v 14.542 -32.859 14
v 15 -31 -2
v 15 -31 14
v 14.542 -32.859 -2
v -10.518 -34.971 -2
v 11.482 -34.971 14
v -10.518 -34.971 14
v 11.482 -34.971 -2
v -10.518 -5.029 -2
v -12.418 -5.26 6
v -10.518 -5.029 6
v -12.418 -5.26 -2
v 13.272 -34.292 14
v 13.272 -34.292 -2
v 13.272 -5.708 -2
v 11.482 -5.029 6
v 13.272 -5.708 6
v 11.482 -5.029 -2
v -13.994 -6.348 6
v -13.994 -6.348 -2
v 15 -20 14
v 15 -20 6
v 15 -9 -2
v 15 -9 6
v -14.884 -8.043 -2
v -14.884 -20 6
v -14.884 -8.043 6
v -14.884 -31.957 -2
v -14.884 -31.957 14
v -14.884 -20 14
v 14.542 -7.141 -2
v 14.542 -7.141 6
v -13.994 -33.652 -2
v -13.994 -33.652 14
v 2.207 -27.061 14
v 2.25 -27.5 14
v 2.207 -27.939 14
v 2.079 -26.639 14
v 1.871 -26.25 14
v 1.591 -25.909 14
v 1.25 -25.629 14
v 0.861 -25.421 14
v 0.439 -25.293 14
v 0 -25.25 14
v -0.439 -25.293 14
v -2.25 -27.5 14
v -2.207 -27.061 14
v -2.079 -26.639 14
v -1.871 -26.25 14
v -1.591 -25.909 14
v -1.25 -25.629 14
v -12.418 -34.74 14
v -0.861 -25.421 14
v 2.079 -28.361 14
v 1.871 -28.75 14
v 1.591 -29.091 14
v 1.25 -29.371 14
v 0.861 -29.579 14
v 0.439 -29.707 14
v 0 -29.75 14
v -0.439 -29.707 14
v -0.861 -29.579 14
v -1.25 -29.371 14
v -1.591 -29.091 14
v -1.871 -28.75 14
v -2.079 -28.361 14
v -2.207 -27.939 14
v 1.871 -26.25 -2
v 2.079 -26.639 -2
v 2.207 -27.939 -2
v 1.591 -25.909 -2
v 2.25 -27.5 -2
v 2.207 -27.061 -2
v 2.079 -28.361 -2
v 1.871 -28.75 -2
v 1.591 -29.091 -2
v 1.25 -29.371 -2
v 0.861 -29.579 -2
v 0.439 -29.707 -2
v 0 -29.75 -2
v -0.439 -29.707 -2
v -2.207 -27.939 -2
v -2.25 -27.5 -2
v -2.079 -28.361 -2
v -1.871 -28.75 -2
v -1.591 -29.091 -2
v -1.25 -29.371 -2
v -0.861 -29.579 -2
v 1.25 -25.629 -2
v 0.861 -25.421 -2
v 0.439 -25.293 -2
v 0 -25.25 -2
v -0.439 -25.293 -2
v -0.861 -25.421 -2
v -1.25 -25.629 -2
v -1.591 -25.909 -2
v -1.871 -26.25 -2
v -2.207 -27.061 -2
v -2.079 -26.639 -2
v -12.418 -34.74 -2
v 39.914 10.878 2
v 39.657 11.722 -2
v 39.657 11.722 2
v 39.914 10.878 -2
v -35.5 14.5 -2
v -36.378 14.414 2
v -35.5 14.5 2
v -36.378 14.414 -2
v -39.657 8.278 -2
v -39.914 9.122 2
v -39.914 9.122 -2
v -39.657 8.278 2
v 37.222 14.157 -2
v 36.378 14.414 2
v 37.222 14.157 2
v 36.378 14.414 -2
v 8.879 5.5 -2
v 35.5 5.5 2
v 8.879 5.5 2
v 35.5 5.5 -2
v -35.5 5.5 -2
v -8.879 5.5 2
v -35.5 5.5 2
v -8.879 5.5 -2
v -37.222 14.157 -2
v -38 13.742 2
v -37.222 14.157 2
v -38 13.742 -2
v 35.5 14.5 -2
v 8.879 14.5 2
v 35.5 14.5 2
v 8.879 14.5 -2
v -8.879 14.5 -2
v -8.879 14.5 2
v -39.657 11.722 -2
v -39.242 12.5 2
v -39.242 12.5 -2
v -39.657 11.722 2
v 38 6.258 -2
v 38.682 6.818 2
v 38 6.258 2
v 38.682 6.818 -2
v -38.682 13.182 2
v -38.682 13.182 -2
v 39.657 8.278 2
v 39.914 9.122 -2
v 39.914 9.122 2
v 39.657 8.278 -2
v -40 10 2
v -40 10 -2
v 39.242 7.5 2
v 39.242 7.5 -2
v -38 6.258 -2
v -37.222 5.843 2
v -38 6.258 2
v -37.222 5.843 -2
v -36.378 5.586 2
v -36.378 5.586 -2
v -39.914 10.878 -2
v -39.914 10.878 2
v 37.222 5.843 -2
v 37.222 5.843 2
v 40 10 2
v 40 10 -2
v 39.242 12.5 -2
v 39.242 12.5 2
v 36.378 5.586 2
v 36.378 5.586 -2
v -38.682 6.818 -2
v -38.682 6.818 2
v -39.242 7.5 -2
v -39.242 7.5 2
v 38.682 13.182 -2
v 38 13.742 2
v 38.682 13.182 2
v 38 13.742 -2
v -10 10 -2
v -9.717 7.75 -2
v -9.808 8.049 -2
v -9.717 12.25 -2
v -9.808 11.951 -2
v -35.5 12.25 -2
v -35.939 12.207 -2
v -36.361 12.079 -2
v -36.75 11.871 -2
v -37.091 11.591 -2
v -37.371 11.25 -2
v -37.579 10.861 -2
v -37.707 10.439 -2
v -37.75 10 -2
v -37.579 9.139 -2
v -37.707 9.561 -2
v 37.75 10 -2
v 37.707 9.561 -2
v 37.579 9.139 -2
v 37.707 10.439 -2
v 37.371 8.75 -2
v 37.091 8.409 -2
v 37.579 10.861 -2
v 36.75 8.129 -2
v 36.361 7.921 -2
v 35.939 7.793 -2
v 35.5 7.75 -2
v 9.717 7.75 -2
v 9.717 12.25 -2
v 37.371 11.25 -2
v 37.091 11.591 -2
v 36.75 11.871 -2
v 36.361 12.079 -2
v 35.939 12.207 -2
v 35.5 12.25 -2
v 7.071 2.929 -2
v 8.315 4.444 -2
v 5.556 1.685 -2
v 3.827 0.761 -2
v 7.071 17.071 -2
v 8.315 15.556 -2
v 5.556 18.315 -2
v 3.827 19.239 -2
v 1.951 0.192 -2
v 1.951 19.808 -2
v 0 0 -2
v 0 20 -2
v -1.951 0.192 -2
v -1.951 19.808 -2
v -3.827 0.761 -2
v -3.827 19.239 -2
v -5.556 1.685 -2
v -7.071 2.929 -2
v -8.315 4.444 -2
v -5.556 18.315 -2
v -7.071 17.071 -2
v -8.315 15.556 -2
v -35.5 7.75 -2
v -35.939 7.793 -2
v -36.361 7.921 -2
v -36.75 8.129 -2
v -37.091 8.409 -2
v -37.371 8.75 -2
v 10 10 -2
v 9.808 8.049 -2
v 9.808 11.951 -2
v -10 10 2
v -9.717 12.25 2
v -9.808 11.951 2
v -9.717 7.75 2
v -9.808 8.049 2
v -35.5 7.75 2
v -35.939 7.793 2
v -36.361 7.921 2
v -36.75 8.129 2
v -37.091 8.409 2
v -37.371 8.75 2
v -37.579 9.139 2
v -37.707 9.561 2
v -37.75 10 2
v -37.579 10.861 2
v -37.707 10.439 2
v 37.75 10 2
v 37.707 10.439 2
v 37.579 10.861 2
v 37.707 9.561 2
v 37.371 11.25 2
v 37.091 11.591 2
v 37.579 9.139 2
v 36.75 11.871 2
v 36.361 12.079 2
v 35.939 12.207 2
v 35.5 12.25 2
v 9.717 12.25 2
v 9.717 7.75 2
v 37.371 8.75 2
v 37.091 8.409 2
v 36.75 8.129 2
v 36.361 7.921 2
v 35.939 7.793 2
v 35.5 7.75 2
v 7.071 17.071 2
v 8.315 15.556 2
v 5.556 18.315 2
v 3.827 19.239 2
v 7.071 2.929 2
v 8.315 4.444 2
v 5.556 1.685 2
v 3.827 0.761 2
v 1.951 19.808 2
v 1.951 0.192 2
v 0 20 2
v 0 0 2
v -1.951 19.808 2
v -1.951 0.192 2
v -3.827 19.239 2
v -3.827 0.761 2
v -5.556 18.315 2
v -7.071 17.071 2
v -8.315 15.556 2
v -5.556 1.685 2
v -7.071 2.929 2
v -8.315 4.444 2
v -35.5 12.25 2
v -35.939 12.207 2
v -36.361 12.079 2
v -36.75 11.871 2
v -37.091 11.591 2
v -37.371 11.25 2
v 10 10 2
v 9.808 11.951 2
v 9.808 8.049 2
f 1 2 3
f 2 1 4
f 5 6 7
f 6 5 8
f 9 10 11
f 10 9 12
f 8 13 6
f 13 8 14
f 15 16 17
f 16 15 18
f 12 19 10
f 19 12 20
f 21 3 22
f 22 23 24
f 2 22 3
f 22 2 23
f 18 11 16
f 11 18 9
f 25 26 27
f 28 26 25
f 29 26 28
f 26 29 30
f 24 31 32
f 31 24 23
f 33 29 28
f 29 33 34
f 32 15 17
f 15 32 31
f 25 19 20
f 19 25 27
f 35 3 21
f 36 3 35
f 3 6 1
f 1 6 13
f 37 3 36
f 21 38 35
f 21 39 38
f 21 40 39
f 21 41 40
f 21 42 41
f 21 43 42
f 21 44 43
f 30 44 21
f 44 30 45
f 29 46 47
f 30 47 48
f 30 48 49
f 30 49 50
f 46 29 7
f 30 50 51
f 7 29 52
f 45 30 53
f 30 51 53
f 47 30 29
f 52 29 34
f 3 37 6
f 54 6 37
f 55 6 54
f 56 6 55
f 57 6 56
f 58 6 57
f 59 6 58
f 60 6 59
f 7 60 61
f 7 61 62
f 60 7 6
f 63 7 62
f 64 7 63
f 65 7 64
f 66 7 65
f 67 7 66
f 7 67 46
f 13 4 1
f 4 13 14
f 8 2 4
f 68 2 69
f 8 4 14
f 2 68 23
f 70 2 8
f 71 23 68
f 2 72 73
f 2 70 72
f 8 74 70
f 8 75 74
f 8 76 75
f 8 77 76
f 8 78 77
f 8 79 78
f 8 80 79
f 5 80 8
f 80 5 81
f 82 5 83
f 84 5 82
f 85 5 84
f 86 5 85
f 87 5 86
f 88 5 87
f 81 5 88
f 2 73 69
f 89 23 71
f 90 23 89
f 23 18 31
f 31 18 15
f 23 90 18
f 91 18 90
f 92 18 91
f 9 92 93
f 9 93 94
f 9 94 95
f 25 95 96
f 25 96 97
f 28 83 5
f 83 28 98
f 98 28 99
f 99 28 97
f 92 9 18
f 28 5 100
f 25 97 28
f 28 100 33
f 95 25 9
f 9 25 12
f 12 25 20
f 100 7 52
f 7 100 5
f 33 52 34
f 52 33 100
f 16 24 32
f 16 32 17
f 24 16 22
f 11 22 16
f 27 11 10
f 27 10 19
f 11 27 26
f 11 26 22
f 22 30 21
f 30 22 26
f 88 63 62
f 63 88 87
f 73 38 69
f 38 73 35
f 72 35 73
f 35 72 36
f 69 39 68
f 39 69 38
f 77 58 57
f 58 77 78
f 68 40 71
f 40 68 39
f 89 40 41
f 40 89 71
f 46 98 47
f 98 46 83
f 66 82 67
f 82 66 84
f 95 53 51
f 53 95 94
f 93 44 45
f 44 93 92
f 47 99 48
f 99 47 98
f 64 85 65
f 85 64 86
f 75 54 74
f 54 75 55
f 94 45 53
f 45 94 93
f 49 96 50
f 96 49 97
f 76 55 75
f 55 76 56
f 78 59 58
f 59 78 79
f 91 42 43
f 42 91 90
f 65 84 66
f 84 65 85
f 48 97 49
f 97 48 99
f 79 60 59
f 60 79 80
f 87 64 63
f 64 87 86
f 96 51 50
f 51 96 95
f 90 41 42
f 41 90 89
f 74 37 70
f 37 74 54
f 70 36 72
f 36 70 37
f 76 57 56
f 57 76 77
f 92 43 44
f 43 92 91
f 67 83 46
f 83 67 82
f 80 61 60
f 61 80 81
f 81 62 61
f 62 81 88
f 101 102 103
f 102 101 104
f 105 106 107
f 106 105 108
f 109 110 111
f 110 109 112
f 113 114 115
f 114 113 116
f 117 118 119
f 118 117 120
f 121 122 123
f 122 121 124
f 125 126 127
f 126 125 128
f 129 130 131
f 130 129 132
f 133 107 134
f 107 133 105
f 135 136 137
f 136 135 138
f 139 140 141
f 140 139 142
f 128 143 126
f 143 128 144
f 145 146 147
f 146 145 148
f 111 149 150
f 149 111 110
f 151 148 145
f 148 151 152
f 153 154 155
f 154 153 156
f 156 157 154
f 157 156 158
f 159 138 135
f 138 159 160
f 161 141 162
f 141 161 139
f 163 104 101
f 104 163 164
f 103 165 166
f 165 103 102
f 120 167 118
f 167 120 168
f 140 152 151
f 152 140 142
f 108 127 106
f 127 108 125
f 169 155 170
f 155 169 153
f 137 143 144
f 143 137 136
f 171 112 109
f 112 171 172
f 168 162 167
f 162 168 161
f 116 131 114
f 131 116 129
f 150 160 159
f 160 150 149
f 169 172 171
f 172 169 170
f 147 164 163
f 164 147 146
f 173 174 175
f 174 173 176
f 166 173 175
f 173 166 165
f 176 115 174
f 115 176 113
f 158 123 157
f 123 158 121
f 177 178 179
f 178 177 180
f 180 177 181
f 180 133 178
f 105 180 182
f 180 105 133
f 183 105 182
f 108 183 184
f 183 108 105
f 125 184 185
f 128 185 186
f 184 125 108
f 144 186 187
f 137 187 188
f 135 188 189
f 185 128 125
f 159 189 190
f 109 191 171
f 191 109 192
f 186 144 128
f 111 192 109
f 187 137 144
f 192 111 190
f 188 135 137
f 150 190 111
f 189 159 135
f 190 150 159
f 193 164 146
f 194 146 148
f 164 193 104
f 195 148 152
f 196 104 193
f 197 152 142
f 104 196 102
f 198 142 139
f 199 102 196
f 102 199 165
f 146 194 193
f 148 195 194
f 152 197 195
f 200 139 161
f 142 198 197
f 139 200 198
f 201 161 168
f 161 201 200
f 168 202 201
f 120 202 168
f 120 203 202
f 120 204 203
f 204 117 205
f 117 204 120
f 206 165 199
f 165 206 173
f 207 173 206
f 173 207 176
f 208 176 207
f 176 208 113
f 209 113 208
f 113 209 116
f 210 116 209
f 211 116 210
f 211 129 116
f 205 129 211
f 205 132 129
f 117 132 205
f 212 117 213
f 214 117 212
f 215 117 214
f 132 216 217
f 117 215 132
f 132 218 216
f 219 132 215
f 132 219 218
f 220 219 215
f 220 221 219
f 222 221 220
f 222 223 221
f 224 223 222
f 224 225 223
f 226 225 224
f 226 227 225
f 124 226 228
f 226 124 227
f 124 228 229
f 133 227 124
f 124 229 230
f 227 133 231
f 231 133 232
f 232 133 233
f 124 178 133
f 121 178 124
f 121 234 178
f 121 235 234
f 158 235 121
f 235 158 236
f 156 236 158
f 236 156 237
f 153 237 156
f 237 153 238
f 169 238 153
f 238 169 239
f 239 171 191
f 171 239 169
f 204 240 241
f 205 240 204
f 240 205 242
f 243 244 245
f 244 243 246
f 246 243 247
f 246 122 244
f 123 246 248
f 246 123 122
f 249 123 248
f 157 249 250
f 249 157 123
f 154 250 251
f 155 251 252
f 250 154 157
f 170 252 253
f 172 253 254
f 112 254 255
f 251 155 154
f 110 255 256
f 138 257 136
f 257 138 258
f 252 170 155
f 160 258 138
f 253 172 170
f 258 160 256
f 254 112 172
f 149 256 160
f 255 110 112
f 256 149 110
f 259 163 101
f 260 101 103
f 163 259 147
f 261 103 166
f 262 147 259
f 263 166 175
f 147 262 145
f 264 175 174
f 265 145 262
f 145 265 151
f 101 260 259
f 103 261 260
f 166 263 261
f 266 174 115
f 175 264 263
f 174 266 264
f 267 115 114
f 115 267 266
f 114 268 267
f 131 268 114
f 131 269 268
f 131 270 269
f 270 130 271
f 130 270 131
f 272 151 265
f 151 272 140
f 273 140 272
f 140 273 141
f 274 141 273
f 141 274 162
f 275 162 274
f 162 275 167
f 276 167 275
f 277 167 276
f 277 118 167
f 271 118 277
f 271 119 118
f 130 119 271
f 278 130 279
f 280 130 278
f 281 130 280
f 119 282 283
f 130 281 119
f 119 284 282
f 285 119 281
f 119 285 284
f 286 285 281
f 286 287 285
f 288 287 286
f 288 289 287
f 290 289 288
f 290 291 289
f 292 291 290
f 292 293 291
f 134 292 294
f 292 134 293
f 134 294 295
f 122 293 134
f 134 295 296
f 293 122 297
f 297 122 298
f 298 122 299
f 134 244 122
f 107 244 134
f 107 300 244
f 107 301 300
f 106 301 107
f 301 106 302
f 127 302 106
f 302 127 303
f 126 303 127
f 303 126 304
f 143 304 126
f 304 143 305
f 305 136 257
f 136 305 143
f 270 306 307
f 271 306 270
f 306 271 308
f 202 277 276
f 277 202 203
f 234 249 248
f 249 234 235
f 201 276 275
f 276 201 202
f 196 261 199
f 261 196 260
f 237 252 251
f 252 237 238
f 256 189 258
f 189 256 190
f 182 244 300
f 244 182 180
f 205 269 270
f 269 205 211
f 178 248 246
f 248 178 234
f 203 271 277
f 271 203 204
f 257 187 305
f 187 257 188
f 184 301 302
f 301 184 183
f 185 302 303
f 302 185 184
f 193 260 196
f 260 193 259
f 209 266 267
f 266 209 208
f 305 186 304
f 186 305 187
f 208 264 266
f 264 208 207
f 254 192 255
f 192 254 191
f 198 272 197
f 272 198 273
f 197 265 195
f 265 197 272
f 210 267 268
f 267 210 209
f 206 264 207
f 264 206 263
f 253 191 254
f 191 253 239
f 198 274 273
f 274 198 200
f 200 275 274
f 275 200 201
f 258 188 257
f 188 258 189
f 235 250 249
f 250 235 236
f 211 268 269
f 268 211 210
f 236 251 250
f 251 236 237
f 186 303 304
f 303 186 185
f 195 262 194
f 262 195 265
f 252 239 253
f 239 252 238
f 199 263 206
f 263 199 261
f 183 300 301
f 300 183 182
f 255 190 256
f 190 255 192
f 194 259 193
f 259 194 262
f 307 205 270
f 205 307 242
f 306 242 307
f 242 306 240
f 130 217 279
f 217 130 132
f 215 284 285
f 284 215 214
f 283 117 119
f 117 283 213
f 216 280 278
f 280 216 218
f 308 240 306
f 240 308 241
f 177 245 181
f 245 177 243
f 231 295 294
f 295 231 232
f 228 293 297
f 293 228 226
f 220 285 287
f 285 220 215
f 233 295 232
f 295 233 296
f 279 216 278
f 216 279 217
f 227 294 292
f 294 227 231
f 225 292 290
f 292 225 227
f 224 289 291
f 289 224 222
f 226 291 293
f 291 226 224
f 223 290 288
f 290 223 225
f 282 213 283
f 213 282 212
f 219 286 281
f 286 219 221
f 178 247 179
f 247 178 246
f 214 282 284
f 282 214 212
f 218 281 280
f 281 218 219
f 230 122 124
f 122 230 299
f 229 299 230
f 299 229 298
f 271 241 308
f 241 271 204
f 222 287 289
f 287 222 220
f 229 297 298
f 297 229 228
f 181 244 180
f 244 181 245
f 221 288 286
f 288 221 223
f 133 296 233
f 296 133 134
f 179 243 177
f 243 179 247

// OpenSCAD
len_phone = 145;
width_phone = 56;
thickness_phone = 8;
corner_round = 8;

d_screw_m4 = 4.5;
thickness_holder = 4;
append = 15;
w_grip = 30;

//holder_base();
//holder_set();
// horizontal_block(20);
// vertical_block(len_phone);
//grip();
test_print_holder();

module test_print_holder() {
translate([0, -20, 6])
grip();
horizontal_block(len_block=width_phone, offset_vertical=10);
}

module grip(){
        difference(){
        grip_base();

        color("red")
        translate([0, w_grip/2, thickness_phone])
        cube([w_grip+1, w_grip, 2*thickness_phone], center=true);
        
        translate ([0, -w_grip/4, 0])
        cylinder(d=d_screw_m4, 3*thickness_phone, center=true, $fn=32);
    }
}

module grip_base() {
    hull() {
        translate([w_grip/2-corner_round/2, -w_grip/2+corner_round/2, 0])
        cylinder(d=corner_round, 2*thickness_phone, center=true);
        translate([-w_grip/2+corner_round/2, -w_grip/2+corner_round/2, 0])
        cylinder(d=corner_round, 2*thickness_phone, center=true);
        translate([w_grip/2-corner_round/2, w_grip/2-corner_round/2, 0])
        cylinder(d=corner_round, 2*thickness_phone, center=true);
        translate([-w_grip/2+corner_round/2, w_grip/2-corner_round/2, 0])
        cylinder(d=corner_round, 2*thickness_phone, center=true);
    }
}

module holder_set() {
    
    holder_base();
    
    translate([0, -len_phone/2, thickness_phone+thickness_holder/2+1])
    rotate([0, 180, 0])
    grip();
    
    translate([0, len_phone/2, thickness_phone+thickness_holder/2])
    rotate([0, 180, 180])
    grip();
    
    translate([width_phone/2, 10, thickness_phone+thickness_holder/2])
    rotate([0, 180, 90])
    grip();
    
    translate([-width_phone/2, 10, thickness_phone+thickness_holder/2])
    rotate([0, 180, -90])
    grip();
    
}

module holder_base() {
    horizontal_block(len_block=width_phone, offset_vertical=10);
    vertical_block(len_block=len_phone);
    }

module vertical_block(len_block) {
    len_block = len_block + append;
    difference() {

        hull() {
            //translate([0, -len_phone/2, 0])
            translate([0, -len_block/2, 0])
                cylinder(d=9, h=thickness_holder, center=true, $fn=32);

            //translate([0, len_phone/2, 0])
            translate([0, len_block/2, 0])
                cylinder(d=9, h=thickness_holder, center=true, $fn=32);
        }
        color("red")
        hull() {
            // translate([0, -len_phone/2, 0])
            translate([0, -len_block/2, 0])
                cylinder(d=d_screw_m4, h=thickness_holder+2, center=true, $fn=32);

            // translate([0, len_phone/2, 0])
            translate([0, len_block/2, 0])
                cylinder(d=d_screw_m4, h=thickness_holder+2, center=true, $fn=32);
        }
    }
}

module horizontal_block(len_block, offset_vertical) {
    len_block = len_block + append;
    translate([0, offset_vertical, 0])
    cylinder(d=20, h=thickness_holder, center=true, $fn=32);

    difference() {
        hull() {
            translate([len_block/2, offset_vertical, 0])
                cylinder(d=9, h=thickness_holder, center=true, $fn=32);

            translate([-len_block/2, offset_vertical, 0])
                cylinder(d=9, h=thickness_holder, center=true, $fn=32);
        }
        color("red")
        hull() {
            translate([len_block/2, offset_vertical,, 0])
                cylinder(d=d_screw_m4, h=thickness_holder+2, center=true, $fn=32);

            translate([-len_block/2, offset_vertical,, 0])
                cylinder(d=d_screw_m4, h=thickness_holder+2, center=true, $fn=32);
        }
    }
}
